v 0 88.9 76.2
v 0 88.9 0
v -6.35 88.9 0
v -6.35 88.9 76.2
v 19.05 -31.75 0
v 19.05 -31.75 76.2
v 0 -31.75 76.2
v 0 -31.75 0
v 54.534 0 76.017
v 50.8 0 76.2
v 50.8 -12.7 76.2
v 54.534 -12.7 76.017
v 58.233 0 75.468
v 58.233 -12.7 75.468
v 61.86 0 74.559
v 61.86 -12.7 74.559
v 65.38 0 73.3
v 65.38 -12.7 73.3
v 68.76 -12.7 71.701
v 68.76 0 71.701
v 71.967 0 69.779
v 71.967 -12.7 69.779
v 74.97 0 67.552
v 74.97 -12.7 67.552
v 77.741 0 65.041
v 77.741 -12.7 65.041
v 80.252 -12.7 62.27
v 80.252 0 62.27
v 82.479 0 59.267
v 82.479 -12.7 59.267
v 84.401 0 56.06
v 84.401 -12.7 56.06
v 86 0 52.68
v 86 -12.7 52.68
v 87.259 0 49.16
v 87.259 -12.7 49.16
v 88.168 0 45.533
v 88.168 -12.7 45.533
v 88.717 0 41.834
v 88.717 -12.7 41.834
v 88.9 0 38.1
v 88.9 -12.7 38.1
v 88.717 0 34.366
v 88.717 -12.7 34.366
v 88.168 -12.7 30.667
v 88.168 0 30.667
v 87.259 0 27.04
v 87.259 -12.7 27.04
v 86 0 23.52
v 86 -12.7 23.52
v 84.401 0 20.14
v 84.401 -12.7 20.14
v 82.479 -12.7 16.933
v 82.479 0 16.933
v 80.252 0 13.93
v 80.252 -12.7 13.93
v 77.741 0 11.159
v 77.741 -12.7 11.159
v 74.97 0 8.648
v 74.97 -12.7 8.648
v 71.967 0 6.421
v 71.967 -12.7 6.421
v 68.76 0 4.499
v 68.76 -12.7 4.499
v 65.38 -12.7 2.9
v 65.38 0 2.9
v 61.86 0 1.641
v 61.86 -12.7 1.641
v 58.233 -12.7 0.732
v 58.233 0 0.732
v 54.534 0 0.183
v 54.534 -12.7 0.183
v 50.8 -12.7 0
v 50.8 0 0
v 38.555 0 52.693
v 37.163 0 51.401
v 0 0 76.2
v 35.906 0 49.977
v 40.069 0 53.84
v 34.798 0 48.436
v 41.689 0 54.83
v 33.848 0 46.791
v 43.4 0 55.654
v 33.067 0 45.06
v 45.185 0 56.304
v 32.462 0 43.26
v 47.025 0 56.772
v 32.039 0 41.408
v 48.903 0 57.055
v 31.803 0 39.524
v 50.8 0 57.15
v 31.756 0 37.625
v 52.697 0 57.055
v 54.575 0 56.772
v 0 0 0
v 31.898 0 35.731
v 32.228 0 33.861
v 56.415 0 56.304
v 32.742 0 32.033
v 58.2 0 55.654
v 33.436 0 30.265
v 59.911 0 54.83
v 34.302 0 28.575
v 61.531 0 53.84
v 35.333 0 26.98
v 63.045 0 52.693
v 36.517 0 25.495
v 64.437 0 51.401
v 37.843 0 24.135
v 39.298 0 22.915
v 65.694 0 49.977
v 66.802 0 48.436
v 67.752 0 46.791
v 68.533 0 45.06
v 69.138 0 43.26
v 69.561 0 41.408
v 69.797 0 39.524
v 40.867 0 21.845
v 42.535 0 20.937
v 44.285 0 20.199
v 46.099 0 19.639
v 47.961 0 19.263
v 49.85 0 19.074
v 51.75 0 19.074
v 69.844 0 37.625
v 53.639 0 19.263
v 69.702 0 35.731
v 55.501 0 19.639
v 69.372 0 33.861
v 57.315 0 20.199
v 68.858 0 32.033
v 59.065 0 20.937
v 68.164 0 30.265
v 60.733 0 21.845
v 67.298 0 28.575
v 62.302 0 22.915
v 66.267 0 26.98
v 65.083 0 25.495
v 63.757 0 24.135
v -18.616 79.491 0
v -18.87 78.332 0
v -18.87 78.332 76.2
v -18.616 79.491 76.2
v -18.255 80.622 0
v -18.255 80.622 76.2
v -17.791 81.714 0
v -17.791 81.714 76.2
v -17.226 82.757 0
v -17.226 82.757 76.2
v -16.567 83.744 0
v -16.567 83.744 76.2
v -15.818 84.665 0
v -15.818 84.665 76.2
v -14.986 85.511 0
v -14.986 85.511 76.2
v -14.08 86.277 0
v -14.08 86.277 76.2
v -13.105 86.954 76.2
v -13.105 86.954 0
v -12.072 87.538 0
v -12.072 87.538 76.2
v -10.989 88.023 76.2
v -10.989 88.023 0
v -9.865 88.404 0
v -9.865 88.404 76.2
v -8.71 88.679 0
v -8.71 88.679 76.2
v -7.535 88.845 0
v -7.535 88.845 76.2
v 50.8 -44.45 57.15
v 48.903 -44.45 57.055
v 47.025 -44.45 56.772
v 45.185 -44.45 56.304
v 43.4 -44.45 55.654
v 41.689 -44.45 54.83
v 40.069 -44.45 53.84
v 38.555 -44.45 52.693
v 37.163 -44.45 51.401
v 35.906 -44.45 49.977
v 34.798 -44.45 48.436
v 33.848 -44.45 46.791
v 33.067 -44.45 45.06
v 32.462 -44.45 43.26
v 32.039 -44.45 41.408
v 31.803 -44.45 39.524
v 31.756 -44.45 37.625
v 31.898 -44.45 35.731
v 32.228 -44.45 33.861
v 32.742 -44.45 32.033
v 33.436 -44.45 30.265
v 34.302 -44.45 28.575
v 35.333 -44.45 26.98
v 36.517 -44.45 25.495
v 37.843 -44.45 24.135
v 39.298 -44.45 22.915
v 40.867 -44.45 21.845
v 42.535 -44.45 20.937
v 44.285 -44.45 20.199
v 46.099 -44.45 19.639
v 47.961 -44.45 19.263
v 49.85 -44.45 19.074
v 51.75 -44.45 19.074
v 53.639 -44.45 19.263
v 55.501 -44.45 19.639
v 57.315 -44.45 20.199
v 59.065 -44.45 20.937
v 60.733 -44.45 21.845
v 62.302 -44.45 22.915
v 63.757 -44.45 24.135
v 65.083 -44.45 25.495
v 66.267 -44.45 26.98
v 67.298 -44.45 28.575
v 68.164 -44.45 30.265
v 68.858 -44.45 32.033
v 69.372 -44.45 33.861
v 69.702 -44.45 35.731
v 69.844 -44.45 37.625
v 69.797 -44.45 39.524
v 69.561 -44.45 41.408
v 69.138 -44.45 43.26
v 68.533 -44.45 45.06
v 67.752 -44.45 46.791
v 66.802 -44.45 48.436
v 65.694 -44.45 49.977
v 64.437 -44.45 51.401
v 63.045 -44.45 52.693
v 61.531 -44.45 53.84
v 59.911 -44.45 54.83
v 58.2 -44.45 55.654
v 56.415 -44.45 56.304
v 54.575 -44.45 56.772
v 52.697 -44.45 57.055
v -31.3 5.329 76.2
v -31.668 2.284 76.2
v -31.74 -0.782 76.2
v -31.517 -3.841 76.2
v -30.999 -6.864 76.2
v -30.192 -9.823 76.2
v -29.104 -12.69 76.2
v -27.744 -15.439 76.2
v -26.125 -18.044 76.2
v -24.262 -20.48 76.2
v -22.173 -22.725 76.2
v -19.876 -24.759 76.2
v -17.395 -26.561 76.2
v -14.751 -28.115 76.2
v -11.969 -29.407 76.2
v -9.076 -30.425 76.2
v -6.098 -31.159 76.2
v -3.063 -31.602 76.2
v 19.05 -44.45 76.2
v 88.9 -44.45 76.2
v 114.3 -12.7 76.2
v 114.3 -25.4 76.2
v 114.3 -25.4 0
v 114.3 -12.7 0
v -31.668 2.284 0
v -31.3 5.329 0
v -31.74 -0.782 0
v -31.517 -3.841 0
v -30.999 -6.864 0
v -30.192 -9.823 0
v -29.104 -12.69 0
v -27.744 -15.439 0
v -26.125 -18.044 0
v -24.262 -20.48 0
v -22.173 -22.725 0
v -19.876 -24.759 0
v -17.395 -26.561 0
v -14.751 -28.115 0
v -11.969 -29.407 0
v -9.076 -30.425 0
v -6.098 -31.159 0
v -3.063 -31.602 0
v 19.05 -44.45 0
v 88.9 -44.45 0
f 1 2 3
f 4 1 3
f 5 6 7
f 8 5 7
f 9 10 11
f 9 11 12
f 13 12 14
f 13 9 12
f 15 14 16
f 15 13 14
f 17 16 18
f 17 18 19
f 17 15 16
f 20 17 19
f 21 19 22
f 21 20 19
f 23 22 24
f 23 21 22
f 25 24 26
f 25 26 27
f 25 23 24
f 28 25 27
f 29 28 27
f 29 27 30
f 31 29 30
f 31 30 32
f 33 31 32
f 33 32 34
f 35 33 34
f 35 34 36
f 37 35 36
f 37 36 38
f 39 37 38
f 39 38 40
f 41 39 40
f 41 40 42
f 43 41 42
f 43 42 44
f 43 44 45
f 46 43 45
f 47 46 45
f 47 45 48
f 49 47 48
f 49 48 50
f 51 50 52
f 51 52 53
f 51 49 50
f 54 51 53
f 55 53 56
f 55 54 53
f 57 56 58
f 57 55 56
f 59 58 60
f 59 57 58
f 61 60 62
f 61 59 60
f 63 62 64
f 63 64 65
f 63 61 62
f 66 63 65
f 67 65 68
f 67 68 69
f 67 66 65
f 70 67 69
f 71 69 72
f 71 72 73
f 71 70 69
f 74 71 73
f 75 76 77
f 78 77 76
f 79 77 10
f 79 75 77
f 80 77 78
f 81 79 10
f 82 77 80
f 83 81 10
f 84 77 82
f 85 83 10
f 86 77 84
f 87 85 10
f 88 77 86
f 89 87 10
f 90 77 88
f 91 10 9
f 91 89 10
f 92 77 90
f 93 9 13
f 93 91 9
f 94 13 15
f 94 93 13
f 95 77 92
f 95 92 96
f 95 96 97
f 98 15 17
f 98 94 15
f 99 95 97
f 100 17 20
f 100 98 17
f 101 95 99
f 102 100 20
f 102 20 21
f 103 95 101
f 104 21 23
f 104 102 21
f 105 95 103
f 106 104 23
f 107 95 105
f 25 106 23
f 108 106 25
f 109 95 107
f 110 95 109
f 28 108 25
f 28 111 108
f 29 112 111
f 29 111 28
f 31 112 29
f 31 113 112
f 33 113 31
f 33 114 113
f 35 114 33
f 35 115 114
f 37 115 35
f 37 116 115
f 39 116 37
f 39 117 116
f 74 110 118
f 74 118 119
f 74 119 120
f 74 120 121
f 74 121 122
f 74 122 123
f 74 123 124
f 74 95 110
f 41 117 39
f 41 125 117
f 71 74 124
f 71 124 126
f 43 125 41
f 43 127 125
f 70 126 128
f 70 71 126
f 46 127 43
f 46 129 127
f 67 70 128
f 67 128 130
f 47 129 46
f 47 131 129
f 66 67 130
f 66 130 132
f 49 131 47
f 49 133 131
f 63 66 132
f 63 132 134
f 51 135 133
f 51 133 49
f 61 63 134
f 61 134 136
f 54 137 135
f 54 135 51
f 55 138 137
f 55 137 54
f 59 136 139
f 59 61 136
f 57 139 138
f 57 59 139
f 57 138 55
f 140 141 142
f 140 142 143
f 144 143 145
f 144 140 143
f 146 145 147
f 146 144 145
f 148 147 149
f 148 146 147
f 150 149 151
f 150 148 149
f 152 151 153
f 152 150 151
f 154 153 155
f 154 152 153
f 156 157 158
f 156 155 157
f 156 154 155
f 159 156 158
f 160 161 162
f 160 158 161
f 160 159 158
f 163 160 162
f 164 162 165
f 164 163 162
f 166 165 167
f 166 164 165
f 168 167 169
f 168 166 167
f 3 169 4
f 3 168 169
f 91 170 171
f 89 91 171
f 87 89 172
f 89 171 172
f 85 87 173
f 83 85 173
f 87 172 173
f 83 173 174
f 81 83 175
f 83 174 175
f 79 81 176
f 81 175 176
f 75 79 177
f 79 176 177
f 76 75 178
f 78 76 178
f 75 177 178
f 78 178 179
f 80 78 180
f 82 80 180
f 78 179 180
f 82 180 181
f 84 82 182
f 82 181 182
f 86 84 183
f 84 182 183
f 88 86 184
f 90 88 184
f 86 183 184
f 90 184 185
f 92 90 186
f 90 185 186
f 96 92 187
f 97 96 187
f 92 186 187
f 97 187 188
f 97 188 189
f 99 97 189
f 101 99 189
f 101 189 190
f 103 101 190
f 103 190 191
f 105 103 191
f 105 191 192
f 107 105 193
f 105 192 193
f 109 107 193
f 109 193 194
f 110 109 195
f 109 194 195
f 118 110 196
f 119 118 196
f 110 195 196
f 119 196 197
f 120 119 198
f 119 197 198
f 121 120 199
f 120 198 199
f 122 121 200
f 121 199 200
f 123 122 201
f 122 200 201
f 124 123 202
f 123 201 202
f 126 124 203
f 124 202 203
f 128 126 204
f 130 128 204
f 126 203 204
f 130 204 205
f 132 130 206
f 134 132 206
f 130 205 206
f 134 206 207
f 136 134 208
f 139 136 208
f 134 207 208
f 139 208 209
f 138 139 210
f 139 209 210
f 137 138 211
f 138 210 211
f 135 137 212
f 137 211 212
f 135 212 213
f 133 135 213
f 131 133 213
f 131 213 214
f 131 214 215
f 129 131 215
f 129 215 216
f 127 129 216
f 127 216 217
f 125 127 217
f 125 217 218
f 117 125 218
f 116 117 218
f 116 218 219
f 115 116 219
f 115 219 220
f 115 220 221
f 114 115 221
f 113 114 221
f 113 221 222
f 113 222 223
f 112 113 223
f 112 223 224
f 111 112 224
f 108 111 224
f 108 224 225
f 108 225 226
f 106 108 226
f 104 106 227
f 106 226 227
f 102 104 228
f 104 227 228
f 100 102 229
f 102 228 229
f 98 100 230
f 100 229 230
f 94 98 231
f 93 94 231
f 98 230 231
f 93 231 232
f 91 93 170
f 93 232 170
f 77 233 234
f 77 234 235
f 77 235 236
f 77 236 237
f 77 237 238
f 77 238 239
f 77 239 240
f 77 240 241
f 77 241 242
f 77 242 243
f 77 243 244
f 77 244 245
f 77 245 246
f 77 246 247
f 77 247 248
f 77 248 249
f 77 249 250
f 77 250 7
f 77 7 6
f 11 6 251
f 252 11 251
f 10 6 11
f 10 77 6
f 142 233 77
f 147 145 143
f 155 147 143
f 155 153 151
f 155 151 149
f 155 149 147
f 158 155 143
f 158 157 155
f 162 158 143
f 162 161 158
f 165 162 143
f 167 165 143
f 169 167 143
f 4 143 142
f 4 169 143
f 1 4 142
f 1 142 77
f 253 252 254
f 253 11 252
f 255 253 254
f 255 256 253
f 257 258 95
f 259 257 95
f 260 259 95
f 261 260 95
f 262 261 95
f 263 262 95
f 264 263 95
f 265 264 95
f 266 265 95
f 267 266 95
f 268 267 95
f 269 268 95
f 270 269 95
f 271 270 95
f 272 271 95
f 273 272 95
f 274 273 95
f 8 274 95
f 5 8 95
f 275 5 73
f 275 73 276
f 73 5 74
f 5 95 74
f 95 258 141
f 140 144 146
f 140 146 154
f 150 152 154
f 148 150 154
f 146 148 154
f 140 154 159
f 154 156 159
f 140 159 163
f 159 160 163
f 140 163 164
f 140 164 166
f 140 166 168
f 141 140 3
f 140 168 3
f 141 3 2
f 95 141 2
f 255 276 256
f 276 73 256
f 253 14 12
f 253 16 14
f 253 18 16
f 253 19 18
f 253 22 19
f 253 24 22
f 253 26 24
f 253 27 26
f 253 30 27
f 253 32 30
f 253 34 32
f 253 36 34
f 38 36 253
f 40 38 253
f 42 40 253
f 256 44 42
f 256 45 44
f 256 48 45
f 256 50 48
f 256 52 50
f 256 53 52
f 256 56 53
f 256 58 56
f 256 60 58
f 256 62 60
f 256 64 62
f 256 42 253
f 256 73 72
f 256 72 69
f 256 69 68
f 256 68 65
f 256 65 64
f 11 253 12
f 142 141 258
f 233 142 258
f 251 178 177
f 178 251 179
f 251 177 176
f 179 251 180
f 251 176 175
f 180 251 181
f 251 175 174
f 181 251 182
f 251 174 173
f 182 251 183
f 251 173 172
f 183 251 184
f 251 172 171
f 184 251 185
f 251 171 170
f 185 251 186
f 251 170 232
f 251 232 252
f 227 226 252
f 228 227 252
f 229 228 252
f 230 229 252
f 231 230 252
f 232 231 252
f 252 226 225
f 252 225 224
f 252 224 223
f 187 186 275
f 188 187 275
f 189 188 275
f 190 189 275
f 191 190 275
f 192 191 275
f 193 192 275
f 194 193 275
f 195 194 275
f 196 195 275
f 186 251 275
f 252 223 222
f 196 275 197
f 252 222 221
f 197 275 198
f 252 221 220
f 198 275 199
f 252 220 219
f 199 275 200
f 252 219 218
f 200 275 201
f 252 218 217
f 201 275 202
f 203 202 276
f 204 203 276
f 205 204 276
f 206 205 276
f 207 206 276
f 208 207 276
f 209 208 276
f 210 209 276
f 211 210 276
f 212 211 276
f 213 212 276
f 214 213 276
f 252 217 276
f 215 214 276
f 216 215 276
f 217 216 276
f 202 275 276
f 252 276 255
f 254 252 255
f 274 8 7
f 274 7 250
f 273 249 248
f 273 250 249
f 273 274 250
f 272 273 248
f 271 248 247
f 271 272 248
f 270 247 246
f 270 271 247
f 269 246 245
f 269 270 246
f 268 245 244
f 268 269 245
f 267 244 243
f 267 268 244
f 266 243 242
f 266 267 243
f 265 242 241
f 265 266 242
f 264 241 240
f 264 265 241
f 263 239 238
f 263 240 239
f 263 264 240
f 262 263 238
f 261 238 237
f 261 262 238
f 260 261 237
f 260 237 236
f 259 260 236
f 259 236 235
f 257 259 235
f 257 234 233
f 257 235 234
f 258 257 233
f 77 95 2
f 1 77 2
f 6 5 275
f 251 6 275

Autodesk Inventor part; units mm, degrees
ref_plane "YZ Plane" through (0, 0, 0) normal (1, 0, 0) x (0, 1, 0)
ref_plane "XZ Plane" through (0, 0, 0) normal (0, 1, 0) x (-1, 0, 0)
ref_plane "XY Plane" through (0, 0, 0) normal (0, 0, 1) x (1, 0, 0)
sketch "main profile" plane through (0, 0, 0) normal (0, 0, 1) x (1, 0, 0)
  line L0 (0, 0) -> (50.8, 0)
  line L1 (50.8, 0) -> (50.8, -12.7)
  line L2 (19.05, -31.75) -> (19.05, -44.45)
  line L3 (19.05, -44.45) -> (88.9, -44.45)
  line L4 (0, 0) -> (0, 88.9)
  line L5 (50.8, -12.7) -> (114.3, -12.7)
  line L6 (114.3, -12.7) -> (114.3, -25.4)
  line L7 (88.9, -44.45) -> (114.3, -25.4)
  line L8 (0, 88.9) -> (-6.35, 88.9)
  arc A0 (-6.35, 88.9) -> (-18.8698, 78.3317) centre (-6.35, 76.2) ccw
  line L9 (-18.8698, 78.3317) -> (-31.2996, 5.3292)
  arc A1 (-31.2996, 5.3292) -> (0, -31.75) centre (0, 0) ccw
  line L10 (19.05, -31.75) -> (0, -31.75)
  dimension "d8" = 50.8
  dimension "d9" = 12.7
  dimension "d11" = 69.85
  dimension "d15" = 114.3
  dimension "d16" = 12.7
  dimension "d18" = 44.45
  dimension "d20" = 19.05
  dimension "d41" = 12.7
  dimension "d42" = 31.75
  dimension "d44" = 31.75
  dimension "d45" = 120.65
  dimension "d56" = 6.35
  dimension "d64" = 114.3
extrude "FULL EXTRUSION" add sketch "main profile" along normal blind 76.2
sketch "Half Circle" plane through (0, 0, 0) normal (0, 1, 0) x (1, 0, 0)
  line L0 (50.8, 0) -> (50.8, -76.2) projected
  circle A0 centre (50.8, -38.1) radius 38.1
  point P0 (0, 0)
  dimension "d55" = 76.2
extrude "Half Circle Extrusion" add sketch "Half Circle" against normal up to surface (12.7 mm away)
sketch "Sketch6" plane through (0, 0, 76.2) normal (0, 1, 0) x (1, 0, 0)
  arc A0 (50.8, 0) -> (50.8, 76.2) centre (50.8, 38.1) ccw projected
  point P0 (0, 76.2)
hole "Hole2" at (50.8, 0, 38.1) direction (0, -1, 0) diameter 38.1 end through all
equation "\"d16\" = d9"
properties part number "ASN4-3-BK" material "Brass, Soft Yellow"
